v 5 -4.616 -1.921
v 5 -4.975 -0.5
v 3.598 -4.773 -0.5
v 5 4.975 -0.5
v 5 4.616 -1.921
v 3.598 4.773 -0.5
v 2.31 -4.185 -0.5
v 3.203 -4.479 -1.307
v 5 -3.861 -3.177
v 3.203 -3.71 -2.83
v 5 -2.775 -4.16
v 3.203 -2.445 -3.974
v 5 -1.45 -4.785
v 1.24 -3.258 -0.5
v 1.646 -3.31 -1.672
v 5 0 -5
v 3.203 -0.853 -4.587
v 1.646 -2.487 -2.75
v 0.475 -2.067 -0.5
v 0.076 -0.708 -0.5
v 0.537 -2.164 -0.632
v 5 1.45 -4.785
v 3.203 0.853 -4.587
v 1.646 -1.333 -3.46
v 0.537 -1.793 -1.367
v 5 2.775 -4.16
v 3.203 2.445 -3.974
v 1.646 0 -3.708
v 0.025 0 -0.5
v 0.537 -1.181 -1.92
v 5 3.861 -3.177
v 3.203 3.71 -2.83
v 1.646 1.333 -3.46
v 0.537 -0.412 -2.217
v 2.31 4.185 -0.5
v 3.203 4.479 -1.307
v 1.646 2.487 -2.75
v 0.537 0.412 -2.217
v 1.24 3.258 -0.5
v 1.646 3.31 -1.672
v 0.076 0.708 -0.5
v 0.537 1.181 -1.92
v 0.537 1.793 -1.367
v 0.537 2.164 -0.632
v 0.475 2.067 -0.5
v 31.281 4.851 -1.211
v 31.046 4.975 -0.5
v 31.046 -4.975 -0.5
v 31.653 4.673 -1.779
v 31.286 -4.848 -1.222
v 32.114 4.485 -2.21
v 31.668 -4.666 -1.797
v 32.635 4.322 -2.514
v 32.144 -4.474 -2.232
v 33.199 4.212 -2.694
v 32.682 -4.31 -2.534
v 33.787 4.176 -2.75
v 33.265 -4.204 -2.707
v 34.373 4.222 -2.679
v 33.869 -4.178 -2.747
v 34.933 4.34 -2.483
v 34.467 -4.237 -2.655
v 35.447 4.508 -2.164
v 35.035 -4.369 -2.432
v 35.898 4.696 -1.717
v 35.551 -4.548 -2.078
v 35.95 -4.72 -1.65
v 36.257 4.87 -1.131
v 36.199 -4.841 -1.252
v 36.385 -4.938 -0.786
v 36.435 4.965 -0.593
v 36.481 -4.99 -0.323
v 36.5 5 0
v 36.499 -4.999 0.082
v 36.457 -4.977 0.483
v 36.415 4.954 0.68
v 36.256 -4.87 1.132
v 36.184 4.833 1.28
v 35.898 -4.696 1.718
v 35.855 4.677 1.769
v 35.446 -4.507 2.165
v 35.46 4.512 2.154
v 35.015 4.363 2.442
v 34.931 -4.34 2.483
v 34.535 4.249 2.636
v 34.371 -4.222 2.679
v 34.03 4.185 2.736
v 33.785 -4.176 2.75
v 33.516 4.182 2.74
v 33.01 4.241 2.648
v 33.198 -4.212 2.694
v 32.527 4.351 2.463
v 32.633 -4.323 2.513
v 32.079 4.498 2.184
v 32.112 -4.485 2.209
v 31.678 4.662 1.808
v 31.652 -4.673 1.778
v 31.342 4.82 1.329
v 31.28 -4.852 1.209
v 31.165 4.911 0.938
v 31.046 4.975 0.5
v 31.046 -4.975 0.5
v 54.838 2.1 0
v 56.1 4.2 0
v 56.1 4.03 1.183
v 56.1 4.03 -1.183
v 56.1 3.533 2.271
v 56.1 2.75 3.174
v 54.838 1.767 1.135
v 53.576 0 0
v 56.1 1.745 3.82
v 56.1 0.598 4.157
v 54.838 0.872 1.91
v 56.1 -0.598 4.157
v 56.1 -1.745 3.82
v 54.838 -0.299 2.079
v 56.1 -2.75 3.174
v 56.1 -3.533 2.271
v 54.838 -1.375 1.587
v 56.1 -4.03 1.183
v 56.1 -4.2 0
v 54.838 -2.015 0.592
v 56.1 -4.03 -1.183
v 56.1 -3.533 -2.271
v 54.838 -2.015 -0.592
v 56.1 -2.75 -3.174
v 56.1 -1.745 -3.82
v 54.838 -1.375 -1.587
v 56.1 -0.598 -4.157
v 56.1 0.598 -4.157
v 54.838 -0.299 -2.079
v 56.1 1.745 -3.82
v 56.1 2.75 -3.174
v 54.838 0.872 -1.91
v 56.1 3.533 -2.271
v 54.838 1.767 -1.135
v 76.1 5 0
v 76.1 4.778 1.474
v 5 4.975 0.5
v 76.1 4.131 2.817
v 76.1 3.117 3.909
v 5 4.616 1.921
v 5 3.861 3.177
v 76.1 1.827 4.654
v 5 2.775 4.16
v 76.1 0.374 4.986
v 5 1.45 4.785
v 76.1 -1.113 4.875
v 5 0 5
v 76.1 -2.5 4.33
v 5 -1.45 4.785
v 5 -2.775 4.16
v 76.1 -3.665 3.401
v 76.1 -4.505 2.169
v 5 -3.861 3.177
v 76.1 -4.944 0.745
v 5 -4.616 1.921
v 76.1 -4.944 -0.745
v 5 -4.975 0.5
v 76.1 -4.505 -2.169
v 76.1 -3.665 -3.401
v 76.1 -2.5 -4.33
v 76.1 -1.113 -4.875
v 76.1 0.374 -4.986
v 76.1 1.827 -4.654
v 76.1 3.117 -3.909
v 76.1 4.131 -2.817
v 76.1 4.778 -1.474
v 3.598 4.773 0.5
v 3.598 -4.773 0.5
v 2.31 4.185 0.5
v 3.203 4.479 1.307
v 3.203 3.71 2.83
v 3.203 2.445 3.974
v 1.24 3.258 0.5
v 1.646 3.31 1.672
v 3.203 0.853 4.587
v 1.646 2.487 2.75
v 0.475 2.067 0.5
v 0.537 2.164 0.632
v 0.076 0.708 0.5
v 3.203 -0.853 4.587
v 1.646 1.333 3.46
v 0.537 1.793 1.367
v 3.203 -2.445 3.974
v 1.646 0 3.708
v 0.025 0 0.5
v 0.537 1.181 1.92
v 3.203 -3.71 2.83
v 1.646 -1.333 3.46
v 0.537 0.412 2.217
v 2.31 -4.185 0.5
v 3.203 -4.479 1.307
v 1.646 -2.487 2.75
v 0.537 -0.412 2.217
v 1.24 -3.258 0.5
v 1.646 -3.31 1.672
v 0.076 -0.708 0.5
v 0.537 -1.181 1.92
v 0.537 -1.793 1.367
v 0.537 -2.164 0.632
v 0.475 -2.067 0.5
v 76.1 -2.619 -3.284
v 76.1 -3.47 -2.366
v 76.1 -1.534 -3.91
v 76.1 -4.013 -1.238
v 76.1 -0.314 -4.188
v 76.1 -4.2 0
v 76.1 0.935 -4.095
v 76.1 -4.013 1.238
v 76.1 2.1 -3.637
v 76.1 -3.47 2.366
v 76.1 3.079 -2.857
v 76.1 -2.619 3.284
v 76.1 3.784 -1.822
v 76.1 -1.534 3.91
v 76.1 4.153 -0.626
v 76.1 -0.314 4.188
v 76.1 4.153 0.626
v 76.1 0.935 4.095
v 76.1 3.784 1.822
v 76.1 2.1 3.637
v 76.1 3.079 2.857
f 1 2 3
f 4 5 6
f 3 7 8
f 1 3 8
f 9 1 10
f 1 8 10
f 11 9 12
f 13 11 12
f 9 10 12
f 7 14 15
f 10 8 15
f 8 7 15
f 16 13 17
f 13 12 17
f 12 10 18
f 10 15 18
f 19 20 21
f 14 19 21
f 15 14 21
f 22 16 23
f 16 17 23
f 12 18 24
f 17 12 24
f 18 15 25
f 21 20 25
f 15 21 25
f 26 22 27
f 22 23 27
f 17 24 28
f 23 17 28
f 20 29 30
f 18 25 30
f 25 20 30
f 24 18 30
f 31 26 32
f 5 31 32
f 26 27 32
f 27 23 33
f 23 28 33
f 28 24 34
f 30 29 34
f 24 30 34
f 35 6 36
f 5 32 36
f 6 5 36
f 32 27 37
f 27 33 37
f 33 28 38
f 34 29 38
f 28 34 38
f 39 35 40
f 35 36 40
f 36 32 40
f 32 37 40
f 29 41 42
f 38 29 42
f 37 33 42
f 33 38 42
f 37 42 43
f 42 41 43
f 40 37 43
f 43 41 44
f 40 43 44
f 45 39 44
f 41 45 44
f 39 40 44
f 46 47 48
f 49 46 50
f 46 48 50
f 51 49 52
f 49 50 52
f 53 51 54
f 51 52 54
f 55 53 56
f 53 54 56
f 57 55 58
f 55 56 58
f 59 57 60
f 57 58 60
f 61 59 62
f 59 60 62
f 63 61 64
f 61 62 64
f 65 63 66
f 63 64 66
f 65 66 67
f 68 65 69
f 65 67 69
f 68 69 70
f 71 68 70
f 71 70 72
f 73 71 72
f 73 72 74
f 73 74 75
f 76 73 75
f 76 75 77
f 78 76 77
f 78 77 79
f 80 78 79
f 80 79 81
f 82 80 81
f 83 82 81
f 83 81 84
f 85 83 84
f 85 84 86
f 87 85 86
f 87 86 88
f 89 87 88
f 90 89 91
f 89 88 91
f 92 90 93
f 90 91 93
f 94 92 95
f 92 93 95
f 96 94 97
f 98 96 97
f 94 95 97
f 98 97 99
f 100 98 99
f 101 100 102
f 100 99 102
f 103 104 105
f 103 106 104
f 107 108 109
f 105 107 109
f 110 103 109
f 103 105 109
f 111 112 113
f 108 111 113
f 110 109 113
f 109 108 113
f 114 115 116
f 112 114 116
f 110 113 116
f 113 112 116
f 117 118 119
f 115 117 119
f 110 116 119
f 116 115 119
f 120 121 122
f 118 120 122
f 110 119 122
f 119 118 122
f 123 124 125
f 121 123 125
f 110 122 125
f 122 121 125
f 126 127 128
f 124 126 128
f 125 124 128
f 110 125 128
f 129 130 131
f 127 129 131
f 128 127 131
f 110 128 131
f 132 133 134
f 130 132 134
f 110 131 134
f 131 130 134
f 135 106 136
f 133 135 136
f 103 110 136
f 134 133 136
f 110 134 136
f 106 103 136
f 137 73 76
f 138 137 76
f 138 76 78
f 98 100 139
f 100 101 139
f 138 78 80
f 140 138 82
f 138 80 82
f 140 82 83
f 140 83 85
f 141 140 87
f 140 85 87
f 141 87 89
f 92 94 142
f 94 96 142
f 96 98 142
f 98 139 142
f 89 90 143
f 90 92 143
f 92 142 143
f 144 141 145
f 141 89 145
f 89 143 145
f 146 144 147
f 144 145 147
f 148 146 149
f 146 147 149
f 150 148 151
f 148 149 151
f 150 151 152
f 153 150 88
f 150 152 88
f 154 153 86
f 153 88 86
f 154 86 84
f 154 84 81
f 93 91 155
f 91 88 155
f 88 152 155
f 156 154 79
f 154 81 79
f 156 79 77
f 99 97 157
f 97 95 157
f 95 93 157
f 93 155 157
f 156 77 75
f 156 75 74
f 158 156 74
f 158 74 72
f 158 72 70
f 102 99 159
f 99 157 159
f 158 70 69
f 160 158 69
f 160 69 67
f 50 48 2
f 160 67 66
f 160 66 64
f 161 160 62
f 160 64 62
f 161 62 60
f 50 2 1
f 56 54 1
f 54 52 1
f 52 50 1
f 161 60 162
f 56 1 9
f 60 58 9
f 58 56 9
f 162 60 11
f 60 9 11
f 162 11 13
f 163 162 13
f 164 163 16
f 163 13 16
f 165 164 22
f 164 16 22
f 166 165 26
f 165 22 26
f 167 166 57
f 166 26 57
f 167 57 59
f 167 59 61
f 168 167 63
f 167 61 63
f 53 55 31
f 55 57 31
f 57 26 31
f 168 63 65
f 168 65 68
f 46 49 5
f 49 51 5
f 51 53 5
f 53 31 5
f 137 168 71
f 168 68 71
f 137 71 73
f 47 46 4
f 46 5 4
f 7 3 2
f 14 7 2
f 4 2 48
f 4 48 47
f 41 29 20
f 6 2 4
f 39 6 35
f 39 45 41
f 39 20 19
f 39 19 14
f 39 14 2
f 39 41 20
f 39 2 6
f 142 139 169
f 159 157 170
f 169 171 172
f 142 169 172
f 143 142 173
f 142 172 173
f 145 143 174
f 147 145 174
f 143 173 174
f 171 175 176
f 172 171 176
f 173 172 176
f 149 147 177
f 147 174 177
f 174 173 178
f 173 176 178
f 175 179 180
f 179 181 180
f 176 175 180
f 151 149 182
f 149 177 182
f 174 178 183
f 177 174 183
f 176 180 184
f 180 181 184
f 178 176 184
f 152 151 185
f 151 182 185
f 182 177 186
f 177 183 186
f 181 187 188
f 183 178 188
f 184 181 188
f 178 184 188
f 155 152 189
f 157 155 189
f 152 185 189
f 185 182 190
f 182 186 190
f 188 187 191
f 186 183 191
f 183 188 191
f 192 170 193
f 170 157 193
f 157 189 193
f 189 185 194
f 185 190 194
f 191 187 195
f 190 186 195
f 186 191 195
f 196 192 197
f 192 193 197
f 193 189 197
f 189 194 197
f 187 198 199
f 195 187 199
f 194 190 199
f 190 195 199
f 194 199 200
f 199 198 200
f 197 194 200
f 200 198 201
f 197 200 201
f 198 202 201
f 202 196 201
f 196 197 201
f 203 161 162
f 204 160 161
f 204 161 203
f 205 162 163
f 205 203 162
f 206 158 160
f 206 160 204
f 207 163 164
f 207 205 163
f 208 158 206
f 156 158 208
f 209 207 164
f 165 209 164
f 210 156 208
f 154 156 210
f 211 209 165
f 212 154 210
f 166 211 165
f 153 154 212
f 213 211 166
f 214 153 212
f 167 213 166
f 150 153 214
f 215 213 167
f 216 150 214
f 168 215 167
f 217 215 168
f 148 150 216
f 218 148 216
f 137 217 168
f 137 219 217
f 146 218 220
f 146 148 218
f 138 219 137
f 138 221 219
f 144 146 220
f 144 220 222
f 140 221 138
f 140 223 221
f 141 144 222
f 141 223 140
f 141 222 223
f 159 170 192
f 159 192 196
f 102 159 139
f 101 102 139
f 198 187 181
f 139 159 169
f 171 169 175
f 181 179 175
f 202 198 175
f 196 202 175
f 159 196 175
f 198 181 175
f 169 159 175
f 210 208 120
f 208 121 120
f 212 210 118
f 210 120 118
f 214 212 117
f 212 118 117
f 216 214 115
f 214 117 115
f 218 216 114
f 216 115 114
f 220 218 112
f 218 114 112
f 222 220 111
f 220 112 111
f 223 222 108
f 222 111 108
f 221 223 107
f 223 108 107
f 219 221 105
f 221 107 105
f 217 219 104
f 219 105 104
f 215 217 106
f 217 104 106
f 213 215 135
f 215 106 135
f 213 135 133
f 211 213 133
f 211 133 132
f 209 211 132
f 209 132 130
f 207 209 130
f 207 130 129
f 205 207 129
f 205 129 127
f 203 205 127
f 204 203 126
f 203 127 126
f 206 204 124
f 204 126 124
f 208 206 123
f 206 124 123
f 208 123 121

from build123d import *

# Parameters (mm, degrees)
F0_R     = 5
F1_DEPTH = 76.1
F2_R     = 5
F3_W     = 10
F3_H     = 1
F4_DEPTH = 33.75
F5_R     = 2.75
F6_DEPTH = 12.5
F8_D     = 8.4
F8_DEPTH = 20
F8_TIP   = 2.5236145999


with BuildPart() as f1:
    # F0 (on Right) → F1 (new body)
    with BuildSketch(Plane.YZ):
        Circle(F0_R)
    extrude(amount=F1_DEPTH)

    # F2
    f2_edges = [f1.edges().sort_by_distance(p)[0] for p in [
        (0, -5, 0),
    ]]
    fillet(f2_edges, radius=F2_R)

    # F3 (on Right) → F4 (cut)
    with BuildSketch(Plane.YZ):
        Rectangle(F3_W, F3_H)
    extrude(amount=F4_DEPTH, mode=Mode.SUBTRACT)

    # F5 (on Front) → F6 (cut, symmetric)
    with BuildSketch(Plane.XZ):
        with Locations((33.75, 0)):
            Circle(F5_R)
    extrude(amount=F6_DEPTH, both=True, mode=Mode.SUBTRACT)

    # F8
    with Locations(Plane.YZ.offset(76.1)):
        with Locations((0, 0)):
            Hole(F8_D / 2, depth=F8_DEPTH)
            with Locations((0, 0, -(F8_DEPTH + F8_TIP / 2))):  # 118° drill point
                Cone(0, F8_D / 2, F8_TIP, mode=Mode.SUBTRACT)


solid = f1.part
